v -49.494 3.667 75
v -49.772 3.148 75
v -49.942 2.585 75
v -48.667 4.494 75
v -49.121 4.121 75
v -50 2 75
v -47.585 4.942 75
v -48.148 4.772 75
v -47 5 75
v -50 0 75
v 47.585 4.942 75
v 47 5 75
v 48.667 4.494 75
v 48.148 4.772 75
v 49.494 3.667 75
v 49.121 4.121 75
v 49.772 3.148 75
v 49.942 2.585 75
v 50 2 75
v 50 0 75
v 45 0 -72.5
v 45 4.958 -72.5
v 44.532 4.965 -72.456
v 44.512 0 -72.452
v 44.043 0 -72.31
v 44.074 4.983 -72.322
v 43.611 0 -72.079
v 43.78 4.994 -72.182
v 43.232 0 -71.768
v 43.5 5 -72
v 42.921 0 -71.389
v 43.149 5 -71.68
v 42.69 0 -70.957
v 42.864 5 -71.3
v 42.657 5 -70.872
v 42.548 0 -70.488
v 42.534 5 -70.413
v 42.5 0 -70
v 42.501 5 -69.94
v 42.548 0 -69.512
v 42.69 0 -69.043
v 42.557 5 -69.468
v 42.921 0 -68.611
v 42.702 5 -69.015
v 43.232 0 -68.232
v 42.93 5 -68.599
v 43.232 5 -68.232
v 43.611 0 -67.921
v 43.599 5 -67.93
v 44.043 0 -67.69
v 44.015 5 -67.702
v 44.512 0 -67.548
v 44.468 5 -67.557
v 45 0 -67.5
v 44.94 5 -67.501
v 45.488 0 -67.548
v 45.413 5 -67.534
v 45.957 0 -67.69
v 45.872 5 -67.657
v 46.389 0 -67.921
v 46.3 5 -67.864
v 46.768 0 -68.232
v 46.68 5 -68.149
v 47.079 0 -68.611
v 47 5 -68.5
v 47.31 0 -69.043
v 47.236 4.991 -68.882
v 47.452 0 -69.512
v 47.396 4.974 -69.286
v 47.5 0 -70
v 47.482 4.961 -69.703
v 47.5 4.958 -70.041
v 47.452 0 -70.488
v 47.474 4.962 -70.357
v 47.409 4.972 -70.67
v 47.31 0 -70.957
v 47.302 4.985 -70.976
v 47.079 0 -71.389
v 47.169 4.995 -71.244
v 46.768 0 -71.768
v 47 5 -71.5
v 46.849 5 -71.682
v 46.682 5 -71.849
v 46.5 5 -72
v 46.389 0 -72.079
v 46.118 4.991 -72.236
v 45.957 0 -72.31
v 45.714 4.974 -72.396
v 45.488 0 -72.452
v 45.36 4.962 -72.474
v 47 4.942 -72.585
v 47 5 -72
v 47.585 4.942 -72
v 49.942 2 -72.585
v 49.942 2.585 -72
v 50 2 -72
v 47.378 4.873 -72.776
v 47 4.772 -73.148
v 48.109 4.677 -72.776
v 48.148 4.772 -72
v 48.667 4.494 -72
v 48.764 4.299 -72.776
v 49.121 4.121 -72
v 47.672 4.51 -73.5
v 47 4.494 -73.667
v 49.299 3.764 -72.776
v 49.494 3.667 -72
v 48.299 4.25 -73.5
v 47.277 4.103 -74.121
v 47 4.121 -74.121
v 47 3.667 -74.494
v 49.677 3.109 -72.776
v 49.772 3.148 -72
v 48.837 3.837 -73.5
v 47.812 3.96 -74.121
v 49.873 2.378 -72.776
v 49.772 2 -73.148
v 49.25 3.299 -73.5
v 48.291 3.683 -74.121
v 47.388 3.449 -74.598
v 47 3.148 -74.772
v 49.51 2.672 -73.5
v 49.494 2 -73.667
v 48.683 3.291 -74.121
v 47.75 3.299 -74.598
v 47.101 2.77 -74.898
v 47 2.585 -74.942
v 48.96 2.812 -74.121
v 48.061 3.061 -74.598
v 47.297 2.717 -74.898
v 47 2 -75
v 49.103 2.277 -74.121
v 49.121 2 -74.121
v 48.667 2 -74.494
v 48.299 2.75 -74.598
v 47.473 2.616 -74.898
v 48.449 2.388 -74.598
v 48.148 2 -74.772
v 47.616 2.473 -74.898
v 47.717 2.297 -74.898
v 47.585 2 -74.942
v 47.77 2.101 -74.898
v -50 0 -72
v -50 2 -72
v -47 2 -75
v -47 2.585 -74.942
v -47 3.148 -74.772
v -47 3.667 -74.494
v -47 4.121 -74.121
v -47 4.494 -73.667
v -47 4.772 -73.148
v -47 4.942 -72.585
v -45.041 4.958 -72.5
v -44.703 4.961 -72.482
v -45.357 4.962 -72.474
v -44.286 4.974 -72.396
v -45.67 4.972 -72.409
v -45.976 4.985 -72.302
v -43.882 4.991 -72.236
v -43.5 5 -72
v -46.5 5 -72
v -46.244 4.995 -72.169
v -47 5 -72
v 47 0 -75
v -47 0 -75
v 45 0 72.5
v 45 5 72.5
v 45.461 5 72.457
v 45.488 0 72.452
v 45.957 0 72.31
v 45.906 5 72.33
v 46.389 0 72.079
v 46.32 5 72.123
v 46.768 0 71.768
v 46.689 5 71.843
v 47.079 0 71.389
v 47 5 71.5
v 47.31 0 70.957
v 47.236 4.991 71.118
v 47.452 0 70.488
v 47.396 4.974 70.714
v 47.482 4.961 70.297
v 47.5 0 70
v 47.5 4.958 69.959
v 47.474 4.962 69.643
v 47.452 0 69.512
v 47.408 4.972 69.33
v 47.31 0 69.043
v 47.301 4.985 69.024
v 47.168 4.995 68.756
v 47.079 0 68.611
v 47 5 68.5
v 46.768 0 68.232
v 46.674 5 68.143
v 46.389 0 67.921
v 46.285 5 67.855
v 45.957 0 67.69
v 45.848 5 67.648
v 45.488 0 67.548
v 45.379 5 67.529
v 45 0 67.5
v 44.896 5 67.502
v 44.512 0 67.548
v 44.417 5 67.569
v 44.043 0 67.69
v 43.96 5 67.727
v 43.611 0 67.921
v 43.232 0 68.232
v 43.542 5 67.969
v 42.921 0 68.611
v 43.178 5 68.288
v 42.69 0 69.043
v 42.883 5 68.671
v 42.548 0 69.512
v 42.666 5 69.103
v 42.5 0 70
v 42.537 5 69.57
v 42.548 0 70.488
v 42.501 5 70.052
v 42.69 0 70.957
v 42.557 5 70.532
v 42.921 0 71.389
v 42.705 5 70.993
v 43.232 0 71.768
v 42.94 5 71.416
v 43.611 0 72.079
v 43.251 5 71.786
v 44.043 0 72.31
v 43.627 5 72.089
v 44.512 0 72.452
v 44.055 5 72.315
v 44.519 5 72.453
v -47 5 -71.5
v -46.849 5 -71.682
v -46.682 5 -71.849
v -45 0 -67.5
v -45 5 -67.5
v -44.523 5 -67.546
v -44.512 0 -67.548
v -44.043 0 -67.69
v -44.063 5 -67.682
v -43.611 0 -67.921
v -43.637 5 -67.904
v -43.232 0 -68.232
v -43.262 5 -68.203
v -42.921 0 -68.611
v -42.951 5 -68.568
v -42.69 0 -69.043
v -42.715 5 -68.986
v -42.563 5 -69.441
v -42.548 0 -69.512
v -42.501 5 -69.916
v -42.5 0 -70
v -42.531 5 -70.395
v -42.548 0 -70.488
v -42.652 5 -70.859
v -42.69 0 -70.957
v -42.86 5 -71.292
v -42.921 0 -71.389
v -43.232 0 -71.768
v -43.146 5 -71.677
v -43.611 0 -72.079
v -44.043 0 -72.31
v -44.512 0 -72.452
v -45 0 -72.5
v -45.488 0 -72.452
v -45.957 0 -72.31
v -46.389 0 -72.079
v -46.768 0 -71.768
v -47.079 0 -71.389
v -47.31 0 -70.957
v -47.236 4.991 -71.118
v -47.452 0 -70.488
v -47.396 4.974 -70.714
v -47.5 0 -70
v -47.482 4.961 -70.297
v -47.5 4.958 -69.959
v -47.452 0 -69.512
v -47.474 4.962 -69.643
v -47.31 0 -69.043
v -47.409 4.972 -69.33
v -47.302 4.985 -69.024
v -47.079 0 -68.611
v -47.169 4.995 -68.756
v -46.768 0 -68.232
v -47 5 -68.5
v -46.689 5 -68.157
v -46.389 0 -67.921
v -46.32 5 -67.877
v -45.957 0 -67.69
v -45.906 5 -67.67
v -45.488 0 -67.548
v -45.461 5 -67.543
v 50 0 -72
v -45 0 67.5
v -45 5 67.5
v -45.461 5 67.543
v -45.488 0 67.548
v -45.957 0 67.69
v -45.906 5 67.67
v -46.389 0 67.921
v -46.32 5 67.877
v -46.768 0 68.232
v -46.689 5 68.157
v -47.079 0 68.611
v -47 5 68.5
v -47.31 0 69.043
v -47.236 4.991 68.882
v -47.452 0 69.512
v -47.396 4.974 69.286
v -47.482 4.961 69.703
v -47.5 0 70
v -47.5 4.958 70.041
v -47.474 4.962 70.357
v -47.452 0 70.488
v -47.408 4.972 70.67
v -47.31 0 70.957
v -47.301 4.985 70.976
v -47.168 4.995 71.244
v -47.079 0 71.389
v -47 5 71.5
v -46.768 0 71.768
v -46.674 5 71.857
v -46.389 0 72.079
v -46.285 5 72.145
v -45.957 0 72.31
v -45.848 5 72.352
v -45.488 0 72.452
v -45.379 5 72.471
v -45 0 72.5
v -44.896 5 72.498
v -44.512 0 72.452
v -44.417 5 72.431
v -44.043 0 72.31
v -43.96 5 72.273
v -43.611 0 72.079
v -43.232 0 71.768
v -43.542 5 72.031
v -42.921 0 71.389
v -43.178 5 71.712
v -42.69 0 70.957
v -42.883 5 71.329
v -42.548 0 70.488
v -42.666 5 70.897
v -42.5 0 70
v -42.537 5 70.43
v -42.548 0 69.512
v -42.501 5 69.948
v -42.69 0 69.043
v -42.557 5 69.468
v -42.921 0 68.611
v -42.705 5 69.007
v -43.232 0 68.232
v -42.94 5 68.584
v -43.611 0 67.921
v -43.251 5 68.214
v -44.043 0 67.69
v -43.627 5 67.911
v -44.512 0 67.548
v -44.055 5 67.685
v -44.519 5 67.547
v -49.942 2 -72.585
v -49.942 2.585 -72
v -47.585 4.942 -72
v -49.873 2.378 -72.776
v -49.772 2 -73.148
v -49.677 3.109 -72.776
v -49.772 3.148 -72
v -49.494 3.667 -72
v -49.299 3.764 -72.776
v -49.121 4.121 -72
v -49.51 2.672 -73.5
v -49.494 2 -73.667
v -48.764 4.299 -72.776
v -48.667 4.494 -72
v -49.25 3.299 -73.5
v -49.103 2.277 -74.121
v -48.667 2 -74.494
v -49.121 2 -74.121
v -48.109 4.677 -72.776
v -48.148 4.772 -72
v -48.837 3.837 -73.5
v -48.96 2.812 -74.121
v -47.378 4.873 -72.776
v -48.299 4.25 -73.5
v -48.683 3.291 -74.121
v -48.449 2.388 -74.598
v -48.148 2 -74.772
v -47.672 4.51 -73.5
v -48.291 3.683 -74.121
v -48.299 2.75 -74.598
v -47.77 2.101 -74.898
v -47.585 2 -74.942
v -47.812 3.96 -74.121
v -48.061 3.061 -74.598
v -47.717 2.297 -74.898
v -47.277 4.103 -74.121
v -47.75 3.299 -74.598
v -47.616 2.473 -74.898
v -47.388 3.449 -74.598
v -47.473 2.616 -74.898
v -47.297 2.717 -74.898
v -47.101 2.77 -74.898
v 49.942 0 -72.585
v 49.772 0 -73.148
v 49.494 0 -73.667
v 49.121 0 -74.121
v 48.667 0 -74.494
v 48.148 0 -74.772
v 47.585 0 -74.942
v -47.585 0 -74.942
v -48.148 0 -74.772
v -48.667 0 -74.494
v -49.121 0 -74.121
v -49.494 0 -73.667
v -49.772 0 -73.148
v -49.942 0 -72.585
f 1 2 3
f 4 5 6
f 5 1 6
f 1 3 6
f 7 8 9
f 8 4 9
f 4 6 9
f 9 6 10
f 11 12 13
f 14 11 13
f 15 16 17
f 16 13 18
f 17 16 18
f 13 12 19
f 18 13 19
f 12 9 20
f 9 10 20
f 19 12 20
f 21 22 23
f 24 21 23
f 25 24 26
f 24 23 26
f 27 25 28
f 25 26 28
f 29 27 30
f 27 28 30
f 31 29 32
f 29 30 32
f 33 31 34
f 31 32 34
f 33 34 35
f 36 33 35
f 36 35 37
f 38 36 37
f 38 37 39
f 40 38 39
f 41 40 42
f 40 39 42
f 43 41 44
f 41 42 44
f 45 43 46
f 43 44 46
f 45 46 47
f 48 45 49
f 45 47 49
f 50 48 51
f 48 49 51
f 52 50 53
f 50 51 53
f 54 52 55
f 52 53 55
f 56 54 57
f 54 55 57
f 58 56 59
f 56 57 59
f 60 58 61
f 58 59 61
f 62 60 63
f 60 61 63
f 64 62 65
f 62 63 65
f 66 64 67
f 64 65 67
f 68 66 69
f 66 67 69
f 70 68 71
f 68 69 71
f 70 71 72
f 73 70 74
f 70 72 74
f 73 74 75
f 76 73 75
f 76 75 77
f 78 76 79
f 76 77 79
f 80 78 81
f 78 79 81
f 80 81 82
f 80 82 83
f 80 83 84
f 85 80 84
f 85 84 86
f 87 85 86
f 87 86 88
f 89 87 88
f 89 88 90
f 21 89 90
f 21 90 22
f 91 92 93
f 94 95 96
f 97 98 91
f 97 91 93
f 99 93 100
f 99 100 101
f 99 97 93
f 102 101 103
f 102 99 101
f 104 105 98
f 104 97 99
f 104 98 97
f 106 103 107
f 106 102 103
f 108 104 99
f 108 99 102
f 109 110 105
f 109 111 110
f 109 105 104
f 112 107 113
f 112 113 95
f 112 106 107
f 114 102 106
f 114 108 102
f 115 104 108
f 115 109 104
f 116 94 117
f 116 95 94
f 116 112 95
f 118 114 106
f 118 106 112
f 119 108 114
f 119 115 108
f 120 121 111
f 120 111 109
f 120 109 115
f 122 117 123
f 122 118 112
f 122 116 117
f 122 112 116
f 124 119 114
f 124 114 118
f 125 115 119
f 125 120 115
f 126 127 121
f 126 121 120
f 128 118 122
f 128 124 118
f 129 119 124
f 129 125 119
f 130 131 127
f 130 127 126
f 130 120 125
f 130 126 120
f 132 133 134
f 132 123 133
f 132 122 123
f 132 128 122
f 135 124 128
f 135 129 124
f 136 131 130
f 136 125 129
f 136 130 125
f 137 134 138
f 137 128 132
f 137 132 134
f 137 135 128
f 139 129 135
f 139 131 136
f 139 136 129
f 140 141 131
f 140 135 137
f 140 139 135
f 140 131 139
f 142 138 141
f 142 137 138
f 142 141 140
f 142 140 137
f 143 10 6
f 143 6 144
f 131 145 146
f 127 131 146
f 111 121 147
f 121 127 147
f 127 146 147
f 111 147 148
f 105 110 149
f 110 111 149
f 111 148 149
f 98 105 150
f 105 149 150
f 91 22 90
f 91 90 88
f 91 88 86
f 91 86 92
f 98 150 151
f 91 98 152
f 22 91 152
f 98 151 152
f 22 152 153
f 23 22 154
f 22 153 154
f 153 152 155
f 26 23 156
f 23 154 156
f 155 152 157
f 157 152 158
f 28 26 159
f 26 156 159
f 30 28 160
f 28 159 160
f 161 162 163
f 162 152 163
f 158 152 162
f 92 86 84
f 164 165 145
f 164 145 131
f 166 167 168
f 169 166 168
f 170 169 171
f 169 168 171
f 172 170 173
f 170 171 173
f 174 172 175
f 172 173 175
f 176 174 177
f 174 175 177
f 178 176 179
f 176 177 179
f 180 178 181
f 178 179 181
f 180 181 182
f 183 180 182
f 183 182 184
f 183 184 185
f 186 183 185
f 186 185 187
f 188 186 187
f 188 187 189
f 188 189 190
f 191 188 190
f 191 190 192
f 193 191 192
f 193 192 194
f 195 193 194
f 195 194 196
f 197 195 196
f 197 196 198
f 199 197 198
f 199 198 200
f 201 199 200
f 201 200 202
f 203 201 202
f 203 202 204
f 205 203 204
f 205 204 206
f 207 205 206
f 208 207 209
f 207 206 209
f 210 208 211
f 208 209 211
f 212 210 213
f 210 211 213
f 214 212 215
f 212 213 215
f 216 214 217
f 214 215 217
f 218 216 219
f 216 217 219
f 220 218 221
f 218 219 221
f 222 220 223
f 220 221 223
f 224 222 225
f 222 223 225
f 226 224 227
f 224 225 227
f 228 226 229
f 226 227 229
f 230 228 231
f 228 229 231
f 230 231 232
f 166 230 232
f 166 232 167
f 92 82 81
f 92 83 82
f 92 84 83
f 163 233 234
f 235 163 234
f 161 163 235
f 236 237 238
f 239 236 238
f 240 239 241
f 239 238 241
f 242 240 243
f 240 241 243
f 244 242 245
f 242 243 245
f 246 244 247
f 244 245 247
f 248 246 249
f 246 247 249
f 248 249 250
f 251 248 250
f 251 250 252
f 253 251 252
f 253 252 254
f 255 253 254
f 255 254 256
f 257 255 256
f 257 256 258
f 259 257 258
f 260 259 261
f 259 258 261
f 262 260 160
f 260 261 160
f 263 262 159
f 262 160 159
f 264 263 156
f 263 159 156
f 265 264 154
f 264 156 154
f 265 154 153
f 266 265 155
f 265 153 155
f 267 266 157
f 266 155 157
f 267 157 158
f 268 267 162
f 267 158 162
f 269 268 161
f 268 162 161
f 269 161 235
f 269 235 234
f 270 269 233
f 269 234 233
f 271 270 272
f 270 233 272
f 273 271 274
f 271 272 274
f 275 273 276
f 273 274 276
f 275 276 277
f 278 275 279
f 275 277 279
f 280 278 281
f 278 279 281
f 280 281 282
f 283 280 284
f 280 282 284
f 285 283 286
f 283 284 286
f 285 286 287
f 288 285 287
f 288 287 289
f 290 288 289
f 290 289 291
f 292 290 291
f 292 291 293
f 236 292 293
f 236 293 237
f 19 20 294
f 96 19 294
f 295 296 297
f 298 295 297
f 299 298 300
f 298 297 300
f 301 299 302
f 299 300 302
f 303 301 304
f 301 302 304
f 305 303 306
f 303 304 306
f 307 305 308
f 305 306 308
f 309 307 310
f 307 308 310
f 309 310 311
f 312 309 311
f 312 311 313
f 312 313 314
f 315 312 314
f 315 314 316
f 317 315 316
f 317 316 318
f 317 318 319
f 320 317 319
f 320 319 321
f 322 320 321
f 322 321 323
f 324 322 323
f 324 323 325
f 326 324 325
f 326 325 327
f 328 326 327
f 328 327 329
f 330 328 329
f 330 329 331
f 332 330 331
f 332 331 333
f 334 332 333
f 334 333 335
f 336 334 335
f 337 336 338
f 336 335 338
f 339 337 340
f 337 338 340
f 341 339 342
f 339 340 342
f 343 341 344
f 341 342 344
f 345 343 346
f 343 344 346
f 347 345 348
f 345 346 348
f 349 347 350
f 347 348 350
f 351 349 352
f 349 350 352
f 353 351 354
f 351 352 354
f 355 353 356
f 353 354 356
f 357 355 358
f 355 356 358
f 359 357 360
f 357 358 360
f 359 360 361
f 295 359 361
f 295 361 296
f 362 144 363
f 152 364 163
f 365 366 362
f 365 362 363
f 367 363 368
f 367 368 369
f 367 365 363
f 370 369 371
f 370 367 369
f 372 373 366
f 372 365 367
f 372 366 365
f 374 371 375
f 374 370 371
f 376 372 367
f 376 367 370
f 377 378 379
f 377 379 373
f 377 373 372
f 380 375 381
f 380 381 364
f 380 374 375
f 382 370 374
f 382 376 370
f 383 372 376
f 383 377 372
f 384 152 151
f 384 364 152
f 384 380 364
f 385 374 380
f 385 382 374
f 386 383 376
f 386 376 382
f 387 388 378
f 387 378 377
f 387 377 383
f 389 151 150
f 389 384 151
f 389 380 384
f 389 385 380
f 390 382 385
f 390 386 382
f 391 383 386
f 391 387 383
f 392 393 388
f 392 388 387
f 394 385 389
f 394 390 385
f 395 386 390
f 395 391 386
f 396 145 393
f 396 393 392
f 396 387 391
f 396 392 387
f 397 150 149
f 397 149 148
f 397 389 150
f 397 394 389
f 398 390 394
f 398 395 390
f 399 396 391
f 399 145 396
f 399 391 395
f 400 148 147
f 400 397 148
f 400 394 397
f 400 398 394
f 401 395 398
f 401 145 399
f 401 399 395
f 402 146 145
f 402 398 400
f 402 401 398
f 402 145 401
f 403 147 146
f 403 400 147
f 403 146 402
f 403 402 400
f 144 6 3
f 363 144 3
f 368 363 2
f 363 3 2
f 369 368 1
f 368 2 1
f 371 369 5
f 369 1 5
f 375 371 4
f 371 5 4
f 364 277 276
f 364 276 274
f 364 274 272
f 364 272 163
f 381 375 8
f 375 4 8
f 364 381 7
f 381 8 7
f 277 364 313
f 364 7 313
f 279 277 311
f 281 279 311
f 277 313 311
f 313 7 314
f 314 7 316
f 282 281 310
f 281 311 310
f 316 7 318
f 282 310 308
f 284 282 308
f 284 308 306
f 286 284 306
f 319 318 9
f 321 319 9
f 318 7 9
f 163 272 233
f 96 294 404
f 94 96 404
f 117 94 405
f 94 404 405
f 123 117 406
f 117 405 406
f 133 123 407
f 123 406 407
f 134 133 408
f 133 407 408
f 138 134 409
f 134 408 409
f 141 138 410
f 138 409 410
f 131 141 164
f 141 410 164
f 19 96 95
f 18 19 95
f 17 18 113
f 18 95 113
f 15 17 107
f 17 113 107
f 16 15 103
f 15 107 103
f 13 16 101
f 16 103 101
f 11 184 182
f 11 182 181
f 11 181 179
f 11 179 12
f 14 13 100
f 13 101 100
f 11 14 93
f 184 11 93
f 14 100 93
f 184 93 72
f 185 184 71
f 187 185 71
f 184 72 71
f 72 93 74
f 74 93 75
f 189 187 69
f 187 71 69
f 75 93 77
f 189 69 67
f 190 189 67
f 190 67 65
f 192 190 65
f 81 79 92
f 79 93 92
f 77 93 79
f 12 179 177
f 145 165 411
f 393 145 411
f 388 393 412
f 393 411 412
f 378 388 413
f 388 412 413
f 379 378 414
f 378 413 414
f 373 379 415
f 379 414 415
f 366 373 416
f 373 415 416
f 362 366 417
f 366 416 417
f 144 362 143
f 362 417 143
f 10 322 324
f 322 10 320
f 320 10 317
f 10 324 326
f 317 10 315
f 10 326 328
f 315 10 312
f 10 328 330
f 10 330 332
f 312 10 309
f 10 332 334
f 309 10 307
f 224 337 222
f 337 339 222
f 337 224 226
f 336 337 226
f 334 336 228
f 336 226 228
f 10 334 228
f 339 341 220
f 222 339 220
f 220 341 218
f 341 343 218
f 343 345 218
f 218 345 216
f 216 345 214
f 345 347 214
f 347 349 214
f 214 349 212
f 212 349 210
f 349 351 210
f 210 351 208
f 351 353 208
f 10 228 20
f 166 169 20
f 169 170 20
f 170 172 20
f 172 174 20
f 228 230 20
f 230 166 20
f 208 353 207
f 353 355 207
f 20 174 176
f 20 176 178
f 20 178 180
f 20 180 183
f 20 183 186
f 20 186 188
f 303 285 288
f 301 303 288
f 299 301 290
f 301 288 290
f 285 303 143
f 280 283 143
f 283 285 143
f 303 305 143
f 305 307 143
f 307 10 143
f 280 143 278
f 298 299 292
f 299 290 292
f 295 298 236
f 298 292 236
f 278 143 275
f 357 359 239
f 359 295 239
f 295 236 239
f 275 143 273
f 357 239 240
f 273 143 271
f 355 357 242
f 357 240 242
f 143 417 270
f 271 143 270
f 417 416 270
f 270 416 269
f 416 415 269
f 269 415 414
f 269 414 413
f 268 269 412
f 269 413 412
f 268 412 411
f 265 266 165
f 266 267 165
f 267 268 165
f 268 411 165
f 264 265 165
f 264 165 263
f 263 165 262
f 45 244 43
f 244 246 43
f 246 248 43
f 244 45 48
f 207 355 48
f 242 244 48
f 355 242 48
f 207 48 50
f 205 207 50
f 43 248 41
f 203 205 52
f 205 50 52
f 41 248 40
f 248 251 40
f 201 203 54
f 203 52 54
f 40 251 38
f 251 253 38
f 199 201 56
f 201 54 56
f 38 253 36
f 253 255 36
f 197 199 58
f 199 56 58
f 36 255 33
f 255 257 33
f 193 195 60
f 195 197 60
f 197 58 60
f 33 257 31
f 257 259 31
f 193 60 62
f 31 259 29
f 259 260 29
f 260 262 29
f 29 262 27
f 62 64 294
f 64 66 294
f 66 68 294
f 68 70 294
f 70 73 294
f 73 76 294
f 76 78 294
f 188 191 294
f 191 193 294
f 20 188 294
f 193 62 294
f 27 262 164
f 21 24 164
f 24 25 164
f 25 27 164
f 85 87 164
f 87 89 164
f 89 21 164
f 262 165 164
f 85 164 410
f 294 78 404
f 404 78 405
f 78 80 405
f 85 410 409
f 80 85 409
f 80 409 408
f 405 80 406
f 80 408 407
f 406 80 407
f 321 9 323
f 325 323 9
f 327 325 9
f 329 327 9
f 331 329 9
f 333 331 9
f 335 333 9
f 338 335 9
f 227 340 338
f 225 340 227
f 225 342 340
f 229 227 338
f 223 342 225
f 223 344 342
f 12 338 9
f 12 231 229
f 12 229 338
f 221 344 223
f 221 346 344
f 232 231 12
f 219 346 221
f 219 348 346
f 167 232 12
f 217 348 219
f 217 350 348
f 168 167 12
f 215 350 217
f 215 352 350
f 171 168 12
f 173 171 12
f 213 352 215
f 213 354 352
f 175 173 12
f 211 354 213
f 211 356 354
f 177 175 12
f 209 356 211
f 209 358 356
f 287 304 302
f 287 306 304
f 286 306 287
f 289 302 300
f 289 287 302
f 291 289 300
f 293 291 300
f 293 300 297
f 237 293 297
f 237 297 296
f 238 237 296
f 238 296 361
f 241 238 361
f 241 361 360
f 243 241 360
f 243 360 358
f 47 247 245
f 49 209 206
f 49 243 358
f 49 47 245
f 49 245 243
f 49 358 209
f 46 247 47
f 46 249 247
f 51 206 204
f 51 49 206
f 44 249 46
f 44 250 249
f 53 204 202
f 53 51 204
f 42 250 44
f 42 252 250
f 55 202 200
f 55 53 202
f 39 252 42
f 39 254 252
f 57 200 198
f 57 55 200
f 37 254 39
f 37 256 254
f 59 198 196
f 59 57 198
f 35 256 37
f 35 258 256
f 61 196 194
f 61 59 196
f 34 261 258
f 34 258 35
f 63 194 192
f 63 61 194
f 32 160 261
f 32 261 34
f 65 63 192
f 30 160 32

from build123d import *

# Parameters (mm, degrees)
SKETCH1_W           = 100
SKETCH1_H           = 150
BOSS_EXTRUDE1_DEPTH = 5
SKETCH2_R           = 2.5
CUT_EXTRUDE1_DEPTH  = 91.277350426
FILLET1_R           = 3


with BuildPart() as part:
    # Sketch1 → Boss-Extrude1 (new body)
    with BuildSketch(Plane(origin=(0, 0, 0), x_dir=(1, 0, 0), z_dir=(0, 1, 0))):
        Rectangle(SKETCH1_W, SKETCH1_H)
    extrude(amount=BOSS_EXTRUDE1_DEPTH)

    # Sketch2 → Cut-Extrude1 (cut, through all)
    with BuildSketch(Plane(origin=(0, 5, 0), x_dir=(1, 0, 0), z_dir=(0, 1, 0))):
        with Locations(Location((-45, 70, 0), (0, 0, 270))):
            Circle(SKETCH2_R)
        with Locations(Location((45, 70, 0), (0, 0, 90))):
            Circle(SKETCH2_R)
        with Locations(Location((45, -70, 0), (0, 0, 270))):
            Circle(SKETCH2_R)
        with Locations(Location((-45, -70, 0), (0, 0, 90))):
            Circle(SKETCH2_R)
    extrude(amount=-CUT_EXTRUDE1_DEPTH, mode=Mode.SUBTRACT)

    # Fillet1
    # the kernel refuses this fillet: 3 mm, written as the material it takes off along each edge
    with BuildSketch(Plane(origin=(-47, 2, -72), x_dir=(-1, 0, 0), z_dir=(0, 0, -1))) as fillet1_piece_1_section:
        Polygon((0, 0), (FILLET1_R, 0), (FILLET1_R, FILLET1_R), (0, FILLET1_R), align=None)
    fillet1_piece_1 = extrude(amount=FILLET1_R, mode=Mode.PRIVATE)
    fillet1_piece_1 = fillet1_piece_1 - Plane(origin=(-47, 2, -72), x_dir=(0.7071067811865475, -0.7071067811865475, 0), z_dir=(0, 0, -1)) * Sphere(FILLET1_R, mode=Mode.PRIVATE)
    add(fillet1_piece_1, mode=Mode.SUBTRACT)
    with BuildSketch(Plane(origin=(47, 2, -72), x_dir=(1, 0, 0), z_dir=(0, 0, -1))) as fillet1_piece_2_section:
        Polygon((0, 0), (FILLET1_R, 0), (FILLET1_R, -FILLET1_R), (0, -FILLET1_R), align=None)
    fillet1_piece_2 = extrude(amount=FILLET1_R, mode=Mode.PRIVATE)
    fillet1_piece_2 = fillet1_piece_2 - Plane(origin=(47, 2, -72), x_dir=(-0.7071067811865475, -0.7071067811865475, 0), z_dir=(0, 0, -1)) * Sphere(FILLET1_R, mode=Mode.PRIVATE)
    add(fillet1_piece_2, mode=Mode.SUBTRACT)
    with BuildSketch(Plane(origin=(-50, 5, 82.5), x_dir=(0, -1, 0), z_dir=(0, 0, -1)), Plane(origin=(50, 5, -72), x_dir=(0, -1, 0), z_dir=(0, 0, 1))) as fillet1_piece_3:
        with BuildLine():
            CenterArc((FILLET1_R, -FILLET1_R), FILLET1_R, 90, 90)
            Line((0, -FILLET1_R), (0, 0))
            Line((0, 0), (FILLET1_R, 0))
        make_face()
    extrude(amount=154.5, mode=Mode.SUBTRACT)
    with BuildSketch(Plane(origin=(-50, -7.5, -75), x_dir=(1, 0, 0), z_dir=(0, 1, 0))) as fillet1_piece_4:
        with BuildLine():
            CenterArc((FILLET1_R, -FILLET1_R), FILLET1_R, 90, 90)
            Line((0, -FILLET1_R), (0, 0))
            Line((0, 0), (FILLET1_R, 0))
        make_face()
    extrude(amount=9.5, mode=Mode.SUBTRACT)
    with BuildSketch(Plane(origin=(50, -7.5, -75), x_dir=(-1, 0, 0), z_dir=(0, 1, 0))) as fillet1_piece_5:
        with BuildLine():
            CenterArc((FILLET1_R, FILLET1_R), FILLET1_R, 180, 90)
            Line((0, FILLET1_R), (0, 0))
            Line((0, 0), (FILLET1_R, 0))
        make_face()
    extrude(amount=9.5, mode=Mode.SUBTRACT)
    with BuildSketch(Plane(origin=(-47, 5, -75), x_dir=(0, -1, 0), z_dir=(1, 0, 0))) as fillet1_piece_6:
        with BuildLine():
            CenterArc((FILLET1_R, -FILLET1_R), FILLET1_R, 90, 90)
            Line((0, -FILLET1_R), (0, 0))
            Line((0, 0), (FILLET1_R, 0))
        make_face()
    extrude(amount=94, mode=Mode.SUBTRACT)


solid = part.part
